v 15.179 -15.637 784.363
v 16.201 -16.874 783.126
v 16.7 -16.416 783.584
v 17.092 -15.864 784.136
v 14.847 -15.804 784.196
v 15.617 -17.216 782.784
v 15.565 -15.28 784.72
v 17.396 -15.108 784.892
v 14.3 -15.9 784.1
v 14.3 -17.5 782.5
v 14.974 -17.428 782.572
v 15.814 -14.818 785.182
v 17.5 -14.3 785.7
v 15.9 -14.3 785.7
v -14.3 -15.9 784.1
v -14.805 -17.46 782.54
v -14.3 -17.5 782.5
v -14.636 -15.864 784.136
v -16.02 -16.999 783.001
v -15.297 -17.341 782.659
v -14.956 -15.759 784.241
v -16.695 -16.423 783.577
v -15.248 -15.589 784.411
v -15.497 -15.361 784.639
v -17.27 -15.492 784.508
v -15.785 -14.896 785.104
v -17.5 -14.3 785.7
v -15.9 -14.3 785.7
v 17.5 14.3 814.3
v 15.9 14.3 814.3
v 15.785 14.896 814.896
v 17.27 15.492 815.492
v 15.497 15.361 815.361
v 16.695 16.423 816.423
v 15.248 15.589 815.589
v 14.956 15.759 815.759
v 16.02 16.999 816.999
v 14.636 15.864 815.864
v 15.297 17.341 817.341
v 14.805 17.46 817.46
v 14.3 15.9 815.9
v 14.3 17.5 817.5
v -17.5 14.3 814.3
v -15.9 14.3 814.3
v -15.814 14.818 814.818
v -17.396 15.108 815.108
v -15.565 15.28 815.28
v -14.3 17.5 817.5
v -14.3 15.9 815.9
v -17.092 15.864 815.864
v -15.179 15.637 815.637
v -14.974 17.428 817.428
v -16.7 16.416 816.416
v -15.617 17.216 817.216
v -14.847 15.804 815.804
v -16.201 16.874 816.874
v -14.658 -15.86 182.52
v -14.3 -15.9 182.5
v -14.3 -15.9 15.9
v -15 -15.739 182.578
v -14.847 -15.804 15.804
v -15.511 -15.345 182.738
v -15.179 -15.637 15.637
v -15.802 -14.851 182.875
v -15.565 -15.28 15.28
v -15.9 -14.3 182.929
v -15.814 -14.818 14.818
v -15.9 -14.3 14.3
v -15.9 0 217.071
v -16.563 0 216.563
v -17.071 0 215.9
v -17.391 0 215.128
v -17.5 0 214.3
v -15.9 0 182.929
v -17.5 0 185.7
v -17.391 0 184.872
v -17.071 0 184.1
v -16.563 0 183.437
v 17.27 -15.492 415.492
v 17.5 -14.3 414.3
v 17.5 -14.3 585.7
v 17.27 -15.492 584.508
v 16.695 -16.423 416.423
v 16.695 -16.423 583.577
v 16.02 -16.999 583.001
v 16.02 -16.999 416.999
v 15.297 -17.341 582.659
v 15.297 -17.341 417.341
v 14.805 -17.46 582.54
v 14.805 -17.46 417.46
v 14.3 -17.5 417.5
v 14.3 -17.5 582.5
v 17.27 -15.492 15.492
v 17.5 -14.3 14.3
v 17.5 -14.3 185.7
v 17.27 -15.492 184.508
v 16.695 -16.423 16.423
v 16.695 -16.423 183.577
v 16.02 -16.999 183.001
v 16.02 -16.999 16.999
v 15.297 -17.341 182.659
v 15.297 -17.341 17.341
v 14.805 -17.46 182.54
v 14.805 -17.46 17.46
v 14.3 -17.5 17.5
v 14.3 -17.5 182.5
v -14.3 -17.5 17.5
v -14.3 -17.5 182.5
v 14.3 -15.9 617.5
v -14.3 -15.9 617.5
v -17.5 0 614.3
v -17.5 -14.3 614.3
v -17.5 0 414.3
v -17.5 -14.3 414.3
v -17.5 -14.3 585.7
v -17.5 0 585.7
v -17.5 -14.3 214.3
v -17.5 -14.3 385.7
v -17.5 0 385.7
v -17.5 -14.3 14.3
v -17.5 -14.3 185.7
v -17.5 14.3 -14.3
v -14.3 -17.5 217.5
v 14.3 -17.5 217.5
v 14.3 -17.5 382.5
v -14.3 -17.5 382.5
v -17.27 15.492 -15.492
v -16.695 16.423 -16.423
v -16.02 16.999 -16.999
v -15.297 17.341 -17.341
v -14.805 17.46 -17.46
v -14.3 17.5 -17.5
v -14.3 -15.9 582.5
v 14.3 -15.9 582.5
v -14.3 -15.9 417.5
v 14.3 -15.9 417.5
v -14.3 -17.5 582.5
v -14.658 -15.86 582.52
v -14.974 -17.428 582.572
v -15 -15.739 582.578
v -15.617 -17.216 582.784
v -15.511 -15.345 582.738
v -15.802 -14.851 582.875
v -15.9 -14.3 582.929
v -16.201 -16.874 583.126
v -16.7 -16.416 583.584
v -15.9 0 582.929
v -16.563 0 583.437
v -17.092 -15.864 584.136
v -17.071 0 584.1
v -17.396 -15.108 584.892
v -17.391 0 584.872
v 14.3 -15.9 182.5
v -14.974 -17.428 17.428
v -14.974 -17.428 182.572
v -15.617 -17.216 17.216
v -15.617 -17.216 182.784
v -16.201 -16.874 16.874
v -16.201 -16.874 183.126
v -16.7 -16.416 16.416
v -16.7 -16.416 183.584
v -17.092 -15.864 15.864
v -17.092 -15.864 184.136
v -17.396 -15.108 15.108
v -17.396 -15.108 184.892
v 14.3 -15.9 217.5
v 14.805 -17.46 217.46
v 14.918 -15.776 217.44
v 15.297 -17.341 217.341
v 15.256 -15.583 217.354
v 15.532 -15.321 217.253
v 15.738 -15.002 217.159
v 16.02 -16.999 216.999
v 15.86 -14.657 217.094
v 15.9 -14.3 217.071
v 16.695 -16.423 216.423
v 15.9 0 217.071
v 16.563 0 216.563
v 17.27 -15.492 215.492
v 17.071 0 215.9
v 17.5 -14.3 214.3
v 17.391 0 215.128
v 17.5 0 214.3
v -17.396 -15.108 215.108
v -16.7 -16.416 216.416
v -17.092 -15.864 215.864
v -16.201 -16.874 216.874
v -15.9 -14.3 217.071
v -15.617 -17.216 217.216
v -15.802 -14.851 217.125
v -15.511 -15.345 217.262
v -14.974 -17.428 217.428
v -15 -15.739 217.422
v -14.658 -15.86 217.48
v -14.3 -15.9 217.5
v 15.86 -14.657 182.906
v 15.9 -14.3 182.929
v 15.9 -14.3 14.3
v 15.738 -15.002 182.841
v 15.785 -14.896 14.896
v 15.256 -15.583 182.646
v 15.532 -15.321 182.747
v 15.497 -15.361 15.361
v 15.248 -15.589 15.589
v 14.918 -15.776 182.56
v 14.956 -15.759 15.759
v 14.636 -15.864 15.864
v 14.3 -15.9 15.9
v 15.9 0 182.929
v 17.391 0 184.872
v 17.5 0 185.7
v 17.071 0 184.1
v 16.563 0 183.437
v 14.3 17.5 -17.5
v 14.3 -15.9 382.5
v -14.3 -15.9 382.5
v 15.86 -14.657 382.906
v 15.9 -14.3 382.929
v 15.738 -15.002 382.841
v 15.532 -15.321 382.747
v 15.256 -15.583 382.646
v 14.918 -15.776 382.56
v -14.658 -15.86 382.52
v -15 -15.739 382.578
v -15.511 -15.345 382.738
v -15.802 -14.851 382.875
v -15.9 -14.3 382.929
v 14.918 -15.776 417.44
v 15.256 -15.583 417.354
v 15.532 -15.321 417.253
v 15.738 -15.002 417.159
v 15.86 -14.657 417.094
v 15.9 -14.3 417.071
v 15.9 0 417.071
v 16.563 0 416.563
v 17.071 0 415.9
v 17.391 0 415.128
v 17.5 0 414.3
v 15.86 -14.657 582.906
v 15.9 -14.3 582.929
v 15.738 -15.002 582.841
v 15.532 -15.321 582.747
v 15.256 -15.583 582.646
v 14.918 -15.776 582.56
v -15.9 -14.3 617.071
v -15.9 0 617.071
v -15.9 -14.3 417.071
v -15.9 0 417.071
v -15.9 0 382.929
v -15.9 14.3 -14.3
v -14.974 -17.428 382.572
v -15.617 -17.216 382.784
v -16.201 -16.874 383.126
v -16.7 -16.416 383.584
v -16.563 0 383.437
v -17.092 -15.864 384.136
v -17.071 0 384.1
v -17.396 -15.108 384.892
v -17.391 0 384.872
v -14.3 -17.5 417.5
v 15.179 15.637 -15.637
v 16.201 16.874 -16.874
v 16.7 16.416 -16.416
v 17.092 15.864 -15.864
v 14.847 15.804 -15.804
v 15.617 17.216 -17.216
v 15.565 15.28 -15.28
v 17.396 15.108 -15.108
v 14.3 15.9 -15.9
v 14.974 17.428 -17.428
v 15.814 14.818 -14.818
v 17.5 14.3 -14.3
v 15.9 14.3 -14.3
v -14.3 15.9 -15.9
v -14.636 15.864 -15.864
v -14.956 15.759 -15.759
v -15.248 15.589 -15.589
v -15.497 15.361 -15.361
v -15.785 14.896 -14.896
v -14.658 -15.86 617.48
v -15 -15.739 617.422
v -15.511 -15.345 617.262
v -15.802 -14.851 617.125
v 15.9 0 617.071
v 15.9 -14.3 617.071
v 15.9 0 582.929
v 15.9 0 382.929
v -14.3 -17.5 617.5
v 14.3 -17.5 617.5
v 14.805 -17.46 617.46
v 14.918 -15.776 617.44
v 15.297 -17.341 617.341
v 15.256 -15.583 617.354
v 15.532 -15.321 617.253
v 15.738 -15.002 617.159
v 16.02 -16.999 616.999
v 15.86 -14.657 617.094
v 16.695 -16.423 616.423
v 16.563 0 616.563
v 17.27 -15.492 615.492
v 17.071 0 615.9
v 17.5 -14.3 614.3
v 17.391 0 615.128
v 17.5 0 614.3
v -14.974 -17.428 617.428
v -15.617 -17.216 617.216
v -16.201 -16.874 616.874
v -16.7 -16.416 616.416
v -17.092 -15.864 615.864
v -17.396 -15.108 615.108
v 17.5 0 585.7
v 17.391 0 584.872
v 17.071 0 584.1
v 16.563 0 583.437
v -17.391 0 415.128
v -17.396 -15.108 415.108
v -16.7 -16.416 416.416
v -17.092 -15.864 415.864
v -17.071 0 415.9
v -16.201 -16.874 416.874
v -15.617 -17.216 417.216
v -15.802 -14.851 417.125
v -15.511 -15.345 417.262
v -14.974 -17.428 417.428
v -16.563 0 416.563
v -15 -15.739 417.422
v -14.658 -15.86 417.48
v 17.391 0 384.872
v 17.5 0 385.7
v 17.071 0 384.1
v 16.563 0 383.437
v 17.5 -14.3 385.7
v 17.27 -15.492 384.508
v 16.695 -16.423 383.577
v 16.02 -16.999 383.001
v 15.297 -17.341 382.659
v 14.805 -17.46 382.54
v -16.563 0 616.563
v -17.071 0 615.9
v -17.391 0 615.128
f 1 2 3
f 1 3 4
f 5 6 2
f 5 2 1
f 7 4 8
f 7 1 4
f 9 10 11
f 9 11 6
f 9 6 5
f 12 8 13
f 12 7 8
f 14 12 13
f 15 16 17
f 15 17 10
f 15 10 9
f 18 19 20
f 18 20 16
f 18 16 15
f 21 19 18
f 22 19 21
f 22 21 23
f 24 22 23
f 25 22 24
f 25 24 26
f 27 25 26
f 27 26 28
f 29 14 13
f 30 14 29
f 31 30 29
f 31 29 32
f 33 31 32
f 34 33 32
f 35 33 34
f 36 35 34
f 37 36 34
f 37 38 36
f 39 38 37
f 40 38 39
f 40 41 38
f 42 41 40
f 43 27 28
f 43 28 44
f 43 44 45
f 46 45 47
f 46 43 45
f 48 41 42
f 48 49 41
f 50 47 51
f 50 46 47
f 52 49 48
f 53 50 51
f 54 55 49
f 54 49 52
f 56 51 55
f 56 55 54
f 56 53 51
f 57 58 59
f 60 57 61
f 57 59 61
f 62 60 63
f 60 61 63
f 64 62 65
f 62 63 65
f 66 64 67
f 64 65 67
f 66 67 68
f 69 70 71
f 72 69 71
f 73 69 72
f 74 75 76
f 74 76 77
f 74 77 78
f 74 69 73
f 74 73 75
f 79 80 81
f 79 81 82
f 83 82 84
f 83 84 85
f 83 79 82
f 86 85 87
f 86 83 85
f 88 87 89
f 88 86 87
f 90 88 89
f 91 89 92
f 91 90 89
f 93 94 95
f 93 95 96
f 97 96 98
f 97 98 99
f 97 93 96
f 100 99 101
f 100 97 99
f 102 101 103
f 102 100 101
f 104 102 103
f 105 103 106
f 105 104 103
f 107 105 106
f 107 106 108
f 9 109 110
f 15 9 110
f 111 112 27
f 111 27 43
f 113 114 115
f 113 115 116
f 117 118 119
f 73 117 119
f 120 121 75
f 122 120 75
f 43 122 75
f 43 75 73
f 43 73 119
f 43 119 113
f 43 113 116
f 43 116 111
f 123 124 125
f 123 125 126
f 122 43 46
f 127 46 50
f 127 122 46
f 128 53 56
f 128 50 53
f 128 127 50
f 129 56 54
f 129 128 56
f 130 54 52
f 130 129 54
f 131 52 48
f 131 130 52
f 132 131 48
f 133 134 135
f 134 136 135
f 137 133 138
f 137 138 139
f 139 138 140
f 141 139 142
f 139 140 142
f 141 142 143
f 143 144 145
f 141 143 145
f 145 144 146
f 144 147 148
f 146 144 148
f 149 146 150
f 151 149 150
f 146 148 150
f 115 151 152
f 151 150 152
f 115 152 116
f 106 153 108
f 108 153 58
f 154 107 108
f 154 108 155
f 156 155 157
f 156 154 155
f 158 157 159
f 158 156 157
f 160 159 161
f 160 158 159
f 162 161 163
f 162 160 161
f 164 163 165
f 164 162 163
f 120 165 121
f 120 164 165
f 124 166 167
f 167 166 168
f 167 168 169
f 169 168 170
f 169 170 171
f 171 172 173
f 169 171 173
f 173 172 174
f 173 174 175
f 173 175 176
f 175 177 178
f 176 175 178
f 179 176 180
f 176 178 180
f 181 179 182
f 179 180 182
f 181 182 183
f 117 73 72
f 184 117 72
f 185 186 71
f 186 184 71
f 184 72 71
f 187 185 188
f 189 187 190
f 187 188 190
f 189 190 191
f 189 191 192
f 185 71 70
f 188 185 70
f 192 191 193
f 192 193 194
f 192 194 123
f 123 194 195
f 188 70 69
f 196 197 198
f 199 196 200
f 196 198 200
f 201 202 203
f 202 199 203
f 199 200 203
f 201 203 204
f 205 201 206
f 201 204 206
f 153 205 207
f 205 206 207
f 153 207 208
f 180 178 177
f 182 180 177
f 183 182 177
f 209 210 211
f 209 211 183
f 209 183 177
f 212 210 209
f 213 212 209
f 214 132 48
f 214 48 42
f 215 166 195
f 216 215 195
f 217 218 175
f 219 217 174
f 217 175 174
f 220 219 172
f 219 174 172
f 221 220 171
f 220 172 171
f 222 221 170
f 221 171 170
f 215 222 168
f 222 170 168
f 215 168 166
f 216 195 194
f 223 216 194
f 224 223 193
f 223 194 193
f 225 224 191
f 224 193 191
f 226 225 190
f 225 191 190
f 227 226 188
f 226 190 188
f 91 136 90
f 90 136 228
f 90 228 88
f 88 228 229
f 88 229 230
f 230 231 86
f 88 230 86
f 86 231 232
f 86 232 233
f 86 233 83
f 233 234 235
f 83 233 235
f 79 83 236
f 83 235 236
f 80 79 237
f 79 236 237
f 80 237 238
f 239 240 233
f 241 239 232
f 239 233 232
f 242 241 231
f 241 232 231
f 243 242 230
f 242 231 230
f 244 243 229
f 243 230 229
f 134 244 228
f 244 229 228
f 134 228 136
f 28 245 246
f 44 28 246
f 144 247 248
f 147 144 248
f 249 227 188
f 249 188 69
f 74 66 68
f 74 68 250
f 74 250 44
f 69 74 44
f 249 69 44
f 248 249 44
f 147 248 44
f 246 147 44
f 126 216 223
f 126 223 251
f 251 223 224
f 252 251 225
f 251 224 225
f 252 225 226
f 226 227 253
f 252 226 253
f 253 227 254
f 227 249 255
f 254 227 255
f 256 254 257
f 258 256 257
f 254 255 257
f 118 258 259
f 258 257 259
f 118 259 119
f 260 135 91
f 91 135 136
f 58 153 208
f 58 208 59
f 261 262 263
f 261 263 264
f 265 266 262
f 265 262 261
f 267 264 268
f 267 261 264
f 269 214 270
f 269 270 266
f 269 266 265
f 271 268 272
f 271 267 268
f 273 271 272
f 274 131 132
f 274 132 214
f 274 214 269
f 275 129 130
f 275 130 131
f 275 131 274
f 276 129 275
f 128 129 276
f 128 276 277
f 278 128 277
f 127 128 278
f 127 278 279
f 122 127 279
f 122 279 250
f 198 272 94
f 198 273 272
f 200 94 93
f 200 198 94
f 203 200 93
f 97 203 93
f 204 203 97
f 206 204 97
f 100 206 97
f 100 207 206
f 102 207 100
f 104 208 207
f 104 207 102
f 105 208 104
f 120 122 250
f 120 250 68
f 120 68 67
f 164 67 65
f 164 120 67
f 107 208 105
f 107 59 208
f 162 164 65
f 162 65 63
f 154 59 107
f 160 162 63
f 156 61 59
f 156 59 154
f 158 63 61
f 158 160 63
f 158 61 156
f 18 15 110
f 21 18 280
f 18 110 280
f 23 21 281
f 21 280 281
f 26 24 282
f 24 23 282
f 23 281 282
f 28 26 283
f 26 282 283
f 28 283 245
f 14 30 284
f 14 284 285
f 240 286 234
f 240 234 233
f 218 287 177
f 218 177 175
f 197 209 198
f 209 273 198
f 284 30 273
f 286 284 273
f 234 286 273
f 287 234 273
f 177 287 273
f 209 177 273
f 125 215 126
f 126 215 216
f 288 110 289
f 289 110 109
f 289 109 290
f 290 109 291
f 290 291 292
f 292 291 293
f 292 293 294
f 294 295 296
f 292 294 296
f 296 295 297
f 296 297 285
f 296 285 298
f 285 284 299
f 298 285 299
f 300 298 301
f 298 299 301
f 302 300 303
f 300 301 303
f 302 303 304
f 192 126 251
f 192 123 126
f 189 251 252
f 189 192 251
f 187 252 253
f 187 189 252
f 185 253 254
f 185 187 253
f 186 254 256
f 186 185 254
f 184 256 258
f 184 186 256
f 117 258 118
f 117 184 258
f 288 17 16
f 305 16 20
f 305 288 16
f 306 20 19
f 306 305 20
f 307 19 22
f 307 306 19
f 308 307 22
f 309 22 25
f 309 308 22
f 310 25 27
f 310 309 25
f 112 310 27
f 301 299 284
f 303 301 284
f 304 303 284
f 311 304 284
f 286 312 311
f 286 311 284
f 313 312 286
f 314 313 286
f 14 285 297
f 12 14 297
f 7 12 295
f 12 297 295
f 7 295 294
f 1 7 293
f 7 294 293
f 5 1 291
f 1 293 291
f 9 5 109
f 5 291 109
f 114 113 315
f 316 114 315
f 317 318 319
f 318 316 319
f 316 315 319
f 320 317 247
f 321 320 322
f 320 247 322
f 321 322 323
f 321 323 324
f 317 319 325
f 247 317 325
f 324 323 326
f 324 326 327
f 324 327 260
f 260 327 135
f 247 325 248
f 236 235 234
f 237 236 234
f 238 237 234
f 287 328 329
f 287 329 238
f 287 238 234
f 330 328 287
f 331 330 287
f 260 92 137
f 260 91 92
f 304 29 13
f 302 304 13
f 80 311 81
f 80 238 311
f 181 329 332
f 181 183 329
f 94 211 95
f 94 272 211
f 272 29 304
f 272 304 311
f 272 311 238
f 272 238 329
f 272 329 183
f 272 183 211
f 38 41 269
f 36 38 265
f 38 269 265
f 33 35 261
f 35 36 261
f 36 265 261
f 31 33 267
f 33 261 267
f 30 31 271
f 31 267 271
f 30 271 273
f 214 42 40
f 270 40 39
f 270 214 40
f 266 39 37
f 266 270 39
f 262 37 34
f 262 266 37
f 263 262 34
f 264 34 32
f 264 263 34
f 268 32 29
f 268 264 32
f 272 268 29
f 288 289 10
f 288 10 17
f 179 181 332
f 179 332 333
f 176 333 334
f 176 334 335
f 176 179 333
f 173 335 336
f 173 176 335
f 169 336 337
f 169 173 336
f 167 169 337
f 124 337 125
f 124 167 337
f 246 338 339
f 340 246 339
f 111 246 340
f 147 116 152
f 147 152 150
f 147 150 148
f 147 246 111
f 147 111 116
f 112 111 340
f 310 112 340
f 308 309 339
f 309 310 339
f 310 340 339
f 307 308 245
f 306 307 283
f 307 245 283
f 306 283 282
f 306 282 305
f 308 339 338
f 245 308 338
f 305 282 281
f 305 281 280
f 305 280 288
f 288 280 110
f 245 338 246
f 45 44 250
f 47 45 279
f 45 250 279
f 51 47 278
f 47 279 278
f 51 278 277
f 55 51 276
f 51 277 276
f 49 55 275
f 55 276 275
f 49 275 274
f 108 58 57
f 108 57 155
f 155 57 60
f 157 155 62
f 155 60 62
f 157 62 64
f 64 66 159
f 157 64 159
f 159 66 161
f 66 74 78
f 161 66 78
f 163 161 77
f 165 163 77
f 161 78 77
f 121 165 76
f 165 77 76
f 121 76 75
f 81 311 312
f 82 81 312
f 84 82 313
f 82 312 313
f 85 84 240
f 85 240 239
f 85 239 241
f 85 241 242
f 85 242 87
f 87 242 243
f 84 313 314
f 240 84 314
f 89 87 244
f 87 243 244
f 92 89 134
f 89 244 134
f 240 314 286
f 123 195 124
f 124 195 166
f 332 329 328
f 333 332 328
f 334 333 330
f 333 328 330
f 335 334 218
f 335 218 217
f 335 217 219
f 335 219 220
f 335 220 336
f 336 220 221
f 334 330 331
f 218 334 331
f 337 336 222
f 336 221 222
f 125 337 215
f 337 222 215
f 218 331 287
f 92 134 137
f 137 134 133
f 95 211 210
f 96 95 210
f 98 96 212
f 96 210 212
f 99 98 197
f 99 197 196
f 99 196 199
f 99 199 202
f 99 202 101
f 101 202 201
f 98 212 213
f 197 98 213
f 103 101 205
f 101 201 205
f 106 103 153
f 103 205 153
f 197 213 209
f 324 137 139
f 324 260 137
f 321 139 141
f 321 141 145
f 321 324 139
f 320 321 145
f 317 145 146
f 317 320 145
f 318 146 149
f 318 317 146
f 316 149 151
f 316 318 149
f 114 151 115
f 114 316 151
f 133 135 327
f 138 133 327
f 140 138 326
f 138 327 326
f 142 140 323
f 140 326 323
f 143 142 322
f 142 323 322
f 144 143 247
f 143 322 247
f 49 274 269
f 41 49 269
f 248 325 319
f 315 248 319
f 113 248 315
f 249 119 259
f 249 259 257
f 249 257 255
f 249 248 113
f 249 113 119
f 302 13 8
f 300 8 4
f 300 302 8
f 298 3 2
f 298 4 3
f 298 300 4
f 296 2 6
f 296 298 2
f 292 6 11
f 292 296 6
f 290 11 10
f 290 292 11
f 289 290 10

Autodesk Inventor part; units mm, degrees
ref_plane "Start plane" through (0, 0, -17.5) normal (0, 0, 1) x (1, 0, 0)
ref_plane "End plane" through (0, 0, 817.5) normal (0, 0, 1) x (1, 0, 0)
sketch "Sketch" plane through (0, 0, 0) normal (0, 0, 1) x (1, 0, 0)
  line L0 (-17.5, -14.3) -> (-17.5, 14.3)
  line L1 (-14.3, 17.5) -> (14.3, 17.5)
  line L2 (17.5, 14.3) -> (17.5, -14.3)
  line L3 (14.3, -17.5) -> (-14.3, -17.5)
  arc A0 (-17.5, -14.3) -> (-14.3, -17.5) centre (-14.3, -14.3) ccw
  arc A1 (-14.3, 17.5) -> (-17.5, 14.3) centre (-14.3, 14.3) ccw
  arc A2 (17.5, 14.3) -> (14.3, 17.5) centre (14.3, 14.3) ccw
  arc A3 (14.3, -17.5) -> (17.5, -14.3) centre (14.3, -14.3) ccw
  arc A4 (-14.3, 15.9) -> (-15.9, 14.3) centre (-14.3, 14.3) ccw
  line L4 (-14.3, 15.9) -> (14.3, 15.9)
  arc A5 (15.9, 14.3) -> (14.3, 15.9) centre (14.3, 14.3) ccw
  line L5 (15.9, 14.3) -> (15.9, -14.3)
  arc A6 (14.3, -15.9) -> (15.9, -14.3) centre (14.3, -14.3) ccw
  line L6 (14.3, -15.9) -> (-14.3, -15.9)
  arc A7 (-15.9, -14.3) -> (-14.3, -15.9) centre (-14.3, -14.3) ccw
  line L7 (-15.9, -14.3) -> (-15.9, 14.3)
  line L8 (0, 25.4278) -> (0, -25.4278) construction
  line L9 (-25.4278, 0) -> (25.4278, 0) construction
  dimension "d7" = 3.2
  dimension "d10" = 35
  dimension "d11" = 35
  dimension "d12" = 1.6
  dimension "d15" = 17.5
  dimension "d16" = 17.5
extrude "Body" add sketch "Sketch" along normal up to surface (835 mm away) from surface at -17.5
sketch "Sketch3" plane through (0, 0, 0) normal (0, 0, 1) x (1, 0, 0)
  line L0 (0, 0) -> (10, 0)
ref_plane "Work Plane3" through (0, 0, 0) normal (0, -1, 0) x (1, 0, 0)
sketch "Sketch4" plane through (0, 0, 0) normal (0, -1, 0) x (1, 0, 0)
  line L0 (-2, -17.5) -> (12, -17.5)
  line L1 (-2, 817.5) -> (12, 817.5)
  dimension "d18" = 835
ref_plane "Work Plane4" through (107.5, 0, -17.5) normal (0, 0, -1) x (-1, 0, 0)
split "Split1" plane through (107.5, 0, -17.5) removes the side toward (0, 0, -1)
ref_plane "Work Plane5" through (17.5, 0, 817.5) normal (0, 0, 1) x (1, 0, 0)
split "Split2" plane through (17.5, 0, 817.5) removes the side toward (0, 0, 1)
ref_plane "Work Plane6" through (0, 17.5, -17.5) normal (0, -0.7071, -0.7071) x (1, 0, 0)
split "Split3" plane through (0, 17.5, -17.5) removes the side toward (0, -0.7071, -0.7071)
ref_plane "Work Plane14" through (0, 17.5, 817.5) normal (0, -0.7071, 0.7071) x (1, 0, 0)
split "Split5" plane through (0, 17.5, 817.5) removes the side toward (0, -0.7071, 0.7071)
ref_plane "Work Plane17" through (0, 0, 200) normal (0, -1, 0) x (0, 0, -1)
ref_plane "Work Plane18" through (0, -500, 200) normal (0, -1, 0) x (0, 0, -1)
ref_plane "Work Plane19" through (0, -250, 200) normal (0, -1, 0) x (0, 0, -1)
sketch "Sketch17" plane through (0, -250, 200) normal (0, -1, 0) x (0, 0, -1)
  arc A0 (-17.5, -14.3) -> (-14.3, -17.5) centre (-14.3, -14.3) ccw
  line L0 (-17.5, -14.3) -> (-17.5, 14.3)
  arc A1 (-14.3, 17.5) -> (-17.5, 14.3) centre (-14.3, 14.3) ccw
  line L1 (-14.3, 17.5) -> (14.3, 17.5)
  arc A2 (17.5, 14.3) -> (14.3, 17.5) centre (14.3, 14.3) ccw
  line L2 (17.5, 14.3) -> (17.5, -14.3)
  arc A3 (14.3, -17.5) -> (17.5, -14.3) centre (14.3, -14.3) ccw
  line L3 (14.3, -17.5) -> (-14.3, -17.5)
  arc A4 (-14.3, 15.9) -> (-15.9, 14.3) centre (-14.3, 14.3) ccw
  line L4 (-14.3, 15.9) -> (14.3, 15.9)
  arc A5 (15.9, 14.3) -> (14.3, 15.9) centre (14.3, 14.3) ccw
  line L5 (15.9, 14.3) -> (15.9, -14.3)
  arc A6 (14.3, -15.9) -> (15.9, -14.3) centre (14.3, -14.3) ccw
  line L6 (14.3, -15.9) -> (-14.3, -15.9)
  arc A7 (-15.9, -14.3) -> (-14.3, -15.9) centre (-14.3, -14.3) ccw
  line L7 (-15.9, -14.3) -> (-15.9, 14.3)
extrude "Extrusion14" cut sketch "Sketch17" along normal up to surface (500 mm away) from surface at -250 contours L0 A1 L1 A2 L2 A3 L3 A0 | L4 A5 L5 A6 L6 A7 L7 A4
ref_plane "Work Plane20" through (0, 0, 400) normal (0, -1, 0) x (0, 0, -1)
ref_plane "Work Plane21" through (0, -500, 400) normal (0, -1, 0) x (0, 0, -1)
ref_plane "Work Plane22" through (0, -250, 400) normal (0, -1, 0) x (0, 0, -1)
sketch "Sketch18" plane through (0, -250, 400) normal (0, -1, 0) x (0, 0, -1)
  arc A0 (-17.5, -14.3) -> (-14.3, -17.5) centre (-14.3, -14.3) ccw
  line L0 (-17.5, -14.3) -> (-17.5, 14.3)
  arc A1 (-14.3, 17.5) -> (-17.5, 14.3) centre (-14.3, 14.3) ccw
  line L1 (-14.3, 17.5) -> (14.3, 17.5)
  arc A2 (17.5, 14.3) -> (14.3, 17.5) centre (14.3, 14.3) ccw
  line L2 (17.5, 14.3) -> (17.5, -14.3)
  arc A3 (14.3, -17.5) -> (17.5, -14.3) centre (14.3, -14.3) ccw
  line L3 (14.3, -17.5) -> (-14.3, -17.5)
  arc A4 (-14.3, 15.9) -> (-15.9, 14.3) centre (-14.3, 14.3) ccw
  line L4 (-14.3, 15.9) -> (14.3, 15.9)
  arc A5 (15.9, 14.3) -> (14.3, 15.9) centre (14.3, 14.3) ccw
  line L5 (15.9, 14.3) -> (15.9, -14.3)
  arc A6 (14.3, -15.9) -> (15.9, -14.3) centre (14.3, -14.3) ccw
  line L6 (14.3, -15.9) -> (-14.3, -15.9)
  arc A7 (-15.9, -14.3) -> (-14.3, -15.9) centre (-14.3, -14.3) ccw
  line L7 (-15.9, -14.3) -> (-15.9, 14.3)
extrude "Extrusion15" cut sketch "Sketch18" along normal up to surface (500 mm away) from surface at -250 contours L0 A1 L1 A2 L2 A3 L3 A0 | L4 A5 L5 A6 L6 A7 L7 A4
ref_plane "Work Plane23" through (0, 0, 600) normal (0, -1, 0) x (0, 0, -1)
ref_plane "Work Plane24" through (0, -500, 600) normal (0, -1, 0) x (0, 0, -1)
ref_plane "Work Plane25" through (0, -250, 600) normal (0, -1, 0) x (0, 0, -1)
sketch "Sketch19" plane through (0, -250, 600) normal (0, -1, 0) x (0, 0, -1)
  arc A0 (-17.5, -14.3) -> (-14.3, -17.5) centre (-14.3, -14.3) ccw
  line L0 (-17.5, -14.3) -> (-17.5, 14.3)
  arc A1 (-14.3, 17.5) -> (-17.5, 14.3) centre (-14.3, 14.3) ccw
  line L1 (-14.3, 17.5) -> (14.3, 17.5)
  arc A2 (17.5, 14.3) -> (14.3, 17.5) centre (14.3, 14.3) ccw
  line L2 (17.5, 14.3) -> (17.5, -14.3)
  arc A3 (14.3, -17.5) -> (17.5, -14.3) centre (14.3, -14.3) ccw
  line L3 (14.3, -17.5) -> (-14.3, -17.5)
  arc A4 (-14.3, 15.9) -> (-15.9, 14.3) centre (-14.3, 14.3) ccw
  line L4 (-14.3, 15.9) -> (14.3, 15.9)
  arc A5 (15.9, 14.3) -> (14.3, 15.9) centre (14.3, 14.3) ccw
  line L5 (15.9, 14.3) -> (15.9, -14.3)
  arc A6 (14.3, -15.9) -> (15.9, -14.3) centre (14.3, -14.3) ccw
  line L6 (14.3, -15.9) -> (-14.3, -15.9)
  arc A7 (-15.9, -14.3) -> (-14.3, -15.9) centre (-14.3, -14.3) ccw
  line L7 (-15.9, -14.3) -> (-15.9, 14.3)
extrude "Extrusion16" cut sketch "Sketch19" along normal up to surface (500 mm away) from surface at -250 contours L0 A1 L1 A2 L2 A3 L3 A0 | L4 A5 L5 A6 L6 A7 L7 A4
equation "\"d7\" = G_IR"
equation "\"d10\" = G_H"
equation "\"d11\" = G_W"
equation "\"d12\" = G_T"
equation "\"d15\" = 0.5 * d10"
equation "\"d16\" = 0.5 * d11"
equation "\"d3\" = G_L"
equation "\"G_W\" = 35"
equation "\"G_H\" = 35"
equation "\"G_T\" = 1.6"
equation "\"G_IR\" = 3.2"
equation "\"G_L\" = 835"
equation "\"G_OFFSET_START\" = 17.5"
equation "\"G_OFFSET_END\" = 17.5"
equation "\"d13\" = -G_OFFSET_START"
equation "\"d14\" = G_OFFSET_END + B_L"
equation "\"B_L\" = 800"
properties part number "AS 1163 - C350L0 35x35x1.6 SHS - 835" material "Steel, Mild"
